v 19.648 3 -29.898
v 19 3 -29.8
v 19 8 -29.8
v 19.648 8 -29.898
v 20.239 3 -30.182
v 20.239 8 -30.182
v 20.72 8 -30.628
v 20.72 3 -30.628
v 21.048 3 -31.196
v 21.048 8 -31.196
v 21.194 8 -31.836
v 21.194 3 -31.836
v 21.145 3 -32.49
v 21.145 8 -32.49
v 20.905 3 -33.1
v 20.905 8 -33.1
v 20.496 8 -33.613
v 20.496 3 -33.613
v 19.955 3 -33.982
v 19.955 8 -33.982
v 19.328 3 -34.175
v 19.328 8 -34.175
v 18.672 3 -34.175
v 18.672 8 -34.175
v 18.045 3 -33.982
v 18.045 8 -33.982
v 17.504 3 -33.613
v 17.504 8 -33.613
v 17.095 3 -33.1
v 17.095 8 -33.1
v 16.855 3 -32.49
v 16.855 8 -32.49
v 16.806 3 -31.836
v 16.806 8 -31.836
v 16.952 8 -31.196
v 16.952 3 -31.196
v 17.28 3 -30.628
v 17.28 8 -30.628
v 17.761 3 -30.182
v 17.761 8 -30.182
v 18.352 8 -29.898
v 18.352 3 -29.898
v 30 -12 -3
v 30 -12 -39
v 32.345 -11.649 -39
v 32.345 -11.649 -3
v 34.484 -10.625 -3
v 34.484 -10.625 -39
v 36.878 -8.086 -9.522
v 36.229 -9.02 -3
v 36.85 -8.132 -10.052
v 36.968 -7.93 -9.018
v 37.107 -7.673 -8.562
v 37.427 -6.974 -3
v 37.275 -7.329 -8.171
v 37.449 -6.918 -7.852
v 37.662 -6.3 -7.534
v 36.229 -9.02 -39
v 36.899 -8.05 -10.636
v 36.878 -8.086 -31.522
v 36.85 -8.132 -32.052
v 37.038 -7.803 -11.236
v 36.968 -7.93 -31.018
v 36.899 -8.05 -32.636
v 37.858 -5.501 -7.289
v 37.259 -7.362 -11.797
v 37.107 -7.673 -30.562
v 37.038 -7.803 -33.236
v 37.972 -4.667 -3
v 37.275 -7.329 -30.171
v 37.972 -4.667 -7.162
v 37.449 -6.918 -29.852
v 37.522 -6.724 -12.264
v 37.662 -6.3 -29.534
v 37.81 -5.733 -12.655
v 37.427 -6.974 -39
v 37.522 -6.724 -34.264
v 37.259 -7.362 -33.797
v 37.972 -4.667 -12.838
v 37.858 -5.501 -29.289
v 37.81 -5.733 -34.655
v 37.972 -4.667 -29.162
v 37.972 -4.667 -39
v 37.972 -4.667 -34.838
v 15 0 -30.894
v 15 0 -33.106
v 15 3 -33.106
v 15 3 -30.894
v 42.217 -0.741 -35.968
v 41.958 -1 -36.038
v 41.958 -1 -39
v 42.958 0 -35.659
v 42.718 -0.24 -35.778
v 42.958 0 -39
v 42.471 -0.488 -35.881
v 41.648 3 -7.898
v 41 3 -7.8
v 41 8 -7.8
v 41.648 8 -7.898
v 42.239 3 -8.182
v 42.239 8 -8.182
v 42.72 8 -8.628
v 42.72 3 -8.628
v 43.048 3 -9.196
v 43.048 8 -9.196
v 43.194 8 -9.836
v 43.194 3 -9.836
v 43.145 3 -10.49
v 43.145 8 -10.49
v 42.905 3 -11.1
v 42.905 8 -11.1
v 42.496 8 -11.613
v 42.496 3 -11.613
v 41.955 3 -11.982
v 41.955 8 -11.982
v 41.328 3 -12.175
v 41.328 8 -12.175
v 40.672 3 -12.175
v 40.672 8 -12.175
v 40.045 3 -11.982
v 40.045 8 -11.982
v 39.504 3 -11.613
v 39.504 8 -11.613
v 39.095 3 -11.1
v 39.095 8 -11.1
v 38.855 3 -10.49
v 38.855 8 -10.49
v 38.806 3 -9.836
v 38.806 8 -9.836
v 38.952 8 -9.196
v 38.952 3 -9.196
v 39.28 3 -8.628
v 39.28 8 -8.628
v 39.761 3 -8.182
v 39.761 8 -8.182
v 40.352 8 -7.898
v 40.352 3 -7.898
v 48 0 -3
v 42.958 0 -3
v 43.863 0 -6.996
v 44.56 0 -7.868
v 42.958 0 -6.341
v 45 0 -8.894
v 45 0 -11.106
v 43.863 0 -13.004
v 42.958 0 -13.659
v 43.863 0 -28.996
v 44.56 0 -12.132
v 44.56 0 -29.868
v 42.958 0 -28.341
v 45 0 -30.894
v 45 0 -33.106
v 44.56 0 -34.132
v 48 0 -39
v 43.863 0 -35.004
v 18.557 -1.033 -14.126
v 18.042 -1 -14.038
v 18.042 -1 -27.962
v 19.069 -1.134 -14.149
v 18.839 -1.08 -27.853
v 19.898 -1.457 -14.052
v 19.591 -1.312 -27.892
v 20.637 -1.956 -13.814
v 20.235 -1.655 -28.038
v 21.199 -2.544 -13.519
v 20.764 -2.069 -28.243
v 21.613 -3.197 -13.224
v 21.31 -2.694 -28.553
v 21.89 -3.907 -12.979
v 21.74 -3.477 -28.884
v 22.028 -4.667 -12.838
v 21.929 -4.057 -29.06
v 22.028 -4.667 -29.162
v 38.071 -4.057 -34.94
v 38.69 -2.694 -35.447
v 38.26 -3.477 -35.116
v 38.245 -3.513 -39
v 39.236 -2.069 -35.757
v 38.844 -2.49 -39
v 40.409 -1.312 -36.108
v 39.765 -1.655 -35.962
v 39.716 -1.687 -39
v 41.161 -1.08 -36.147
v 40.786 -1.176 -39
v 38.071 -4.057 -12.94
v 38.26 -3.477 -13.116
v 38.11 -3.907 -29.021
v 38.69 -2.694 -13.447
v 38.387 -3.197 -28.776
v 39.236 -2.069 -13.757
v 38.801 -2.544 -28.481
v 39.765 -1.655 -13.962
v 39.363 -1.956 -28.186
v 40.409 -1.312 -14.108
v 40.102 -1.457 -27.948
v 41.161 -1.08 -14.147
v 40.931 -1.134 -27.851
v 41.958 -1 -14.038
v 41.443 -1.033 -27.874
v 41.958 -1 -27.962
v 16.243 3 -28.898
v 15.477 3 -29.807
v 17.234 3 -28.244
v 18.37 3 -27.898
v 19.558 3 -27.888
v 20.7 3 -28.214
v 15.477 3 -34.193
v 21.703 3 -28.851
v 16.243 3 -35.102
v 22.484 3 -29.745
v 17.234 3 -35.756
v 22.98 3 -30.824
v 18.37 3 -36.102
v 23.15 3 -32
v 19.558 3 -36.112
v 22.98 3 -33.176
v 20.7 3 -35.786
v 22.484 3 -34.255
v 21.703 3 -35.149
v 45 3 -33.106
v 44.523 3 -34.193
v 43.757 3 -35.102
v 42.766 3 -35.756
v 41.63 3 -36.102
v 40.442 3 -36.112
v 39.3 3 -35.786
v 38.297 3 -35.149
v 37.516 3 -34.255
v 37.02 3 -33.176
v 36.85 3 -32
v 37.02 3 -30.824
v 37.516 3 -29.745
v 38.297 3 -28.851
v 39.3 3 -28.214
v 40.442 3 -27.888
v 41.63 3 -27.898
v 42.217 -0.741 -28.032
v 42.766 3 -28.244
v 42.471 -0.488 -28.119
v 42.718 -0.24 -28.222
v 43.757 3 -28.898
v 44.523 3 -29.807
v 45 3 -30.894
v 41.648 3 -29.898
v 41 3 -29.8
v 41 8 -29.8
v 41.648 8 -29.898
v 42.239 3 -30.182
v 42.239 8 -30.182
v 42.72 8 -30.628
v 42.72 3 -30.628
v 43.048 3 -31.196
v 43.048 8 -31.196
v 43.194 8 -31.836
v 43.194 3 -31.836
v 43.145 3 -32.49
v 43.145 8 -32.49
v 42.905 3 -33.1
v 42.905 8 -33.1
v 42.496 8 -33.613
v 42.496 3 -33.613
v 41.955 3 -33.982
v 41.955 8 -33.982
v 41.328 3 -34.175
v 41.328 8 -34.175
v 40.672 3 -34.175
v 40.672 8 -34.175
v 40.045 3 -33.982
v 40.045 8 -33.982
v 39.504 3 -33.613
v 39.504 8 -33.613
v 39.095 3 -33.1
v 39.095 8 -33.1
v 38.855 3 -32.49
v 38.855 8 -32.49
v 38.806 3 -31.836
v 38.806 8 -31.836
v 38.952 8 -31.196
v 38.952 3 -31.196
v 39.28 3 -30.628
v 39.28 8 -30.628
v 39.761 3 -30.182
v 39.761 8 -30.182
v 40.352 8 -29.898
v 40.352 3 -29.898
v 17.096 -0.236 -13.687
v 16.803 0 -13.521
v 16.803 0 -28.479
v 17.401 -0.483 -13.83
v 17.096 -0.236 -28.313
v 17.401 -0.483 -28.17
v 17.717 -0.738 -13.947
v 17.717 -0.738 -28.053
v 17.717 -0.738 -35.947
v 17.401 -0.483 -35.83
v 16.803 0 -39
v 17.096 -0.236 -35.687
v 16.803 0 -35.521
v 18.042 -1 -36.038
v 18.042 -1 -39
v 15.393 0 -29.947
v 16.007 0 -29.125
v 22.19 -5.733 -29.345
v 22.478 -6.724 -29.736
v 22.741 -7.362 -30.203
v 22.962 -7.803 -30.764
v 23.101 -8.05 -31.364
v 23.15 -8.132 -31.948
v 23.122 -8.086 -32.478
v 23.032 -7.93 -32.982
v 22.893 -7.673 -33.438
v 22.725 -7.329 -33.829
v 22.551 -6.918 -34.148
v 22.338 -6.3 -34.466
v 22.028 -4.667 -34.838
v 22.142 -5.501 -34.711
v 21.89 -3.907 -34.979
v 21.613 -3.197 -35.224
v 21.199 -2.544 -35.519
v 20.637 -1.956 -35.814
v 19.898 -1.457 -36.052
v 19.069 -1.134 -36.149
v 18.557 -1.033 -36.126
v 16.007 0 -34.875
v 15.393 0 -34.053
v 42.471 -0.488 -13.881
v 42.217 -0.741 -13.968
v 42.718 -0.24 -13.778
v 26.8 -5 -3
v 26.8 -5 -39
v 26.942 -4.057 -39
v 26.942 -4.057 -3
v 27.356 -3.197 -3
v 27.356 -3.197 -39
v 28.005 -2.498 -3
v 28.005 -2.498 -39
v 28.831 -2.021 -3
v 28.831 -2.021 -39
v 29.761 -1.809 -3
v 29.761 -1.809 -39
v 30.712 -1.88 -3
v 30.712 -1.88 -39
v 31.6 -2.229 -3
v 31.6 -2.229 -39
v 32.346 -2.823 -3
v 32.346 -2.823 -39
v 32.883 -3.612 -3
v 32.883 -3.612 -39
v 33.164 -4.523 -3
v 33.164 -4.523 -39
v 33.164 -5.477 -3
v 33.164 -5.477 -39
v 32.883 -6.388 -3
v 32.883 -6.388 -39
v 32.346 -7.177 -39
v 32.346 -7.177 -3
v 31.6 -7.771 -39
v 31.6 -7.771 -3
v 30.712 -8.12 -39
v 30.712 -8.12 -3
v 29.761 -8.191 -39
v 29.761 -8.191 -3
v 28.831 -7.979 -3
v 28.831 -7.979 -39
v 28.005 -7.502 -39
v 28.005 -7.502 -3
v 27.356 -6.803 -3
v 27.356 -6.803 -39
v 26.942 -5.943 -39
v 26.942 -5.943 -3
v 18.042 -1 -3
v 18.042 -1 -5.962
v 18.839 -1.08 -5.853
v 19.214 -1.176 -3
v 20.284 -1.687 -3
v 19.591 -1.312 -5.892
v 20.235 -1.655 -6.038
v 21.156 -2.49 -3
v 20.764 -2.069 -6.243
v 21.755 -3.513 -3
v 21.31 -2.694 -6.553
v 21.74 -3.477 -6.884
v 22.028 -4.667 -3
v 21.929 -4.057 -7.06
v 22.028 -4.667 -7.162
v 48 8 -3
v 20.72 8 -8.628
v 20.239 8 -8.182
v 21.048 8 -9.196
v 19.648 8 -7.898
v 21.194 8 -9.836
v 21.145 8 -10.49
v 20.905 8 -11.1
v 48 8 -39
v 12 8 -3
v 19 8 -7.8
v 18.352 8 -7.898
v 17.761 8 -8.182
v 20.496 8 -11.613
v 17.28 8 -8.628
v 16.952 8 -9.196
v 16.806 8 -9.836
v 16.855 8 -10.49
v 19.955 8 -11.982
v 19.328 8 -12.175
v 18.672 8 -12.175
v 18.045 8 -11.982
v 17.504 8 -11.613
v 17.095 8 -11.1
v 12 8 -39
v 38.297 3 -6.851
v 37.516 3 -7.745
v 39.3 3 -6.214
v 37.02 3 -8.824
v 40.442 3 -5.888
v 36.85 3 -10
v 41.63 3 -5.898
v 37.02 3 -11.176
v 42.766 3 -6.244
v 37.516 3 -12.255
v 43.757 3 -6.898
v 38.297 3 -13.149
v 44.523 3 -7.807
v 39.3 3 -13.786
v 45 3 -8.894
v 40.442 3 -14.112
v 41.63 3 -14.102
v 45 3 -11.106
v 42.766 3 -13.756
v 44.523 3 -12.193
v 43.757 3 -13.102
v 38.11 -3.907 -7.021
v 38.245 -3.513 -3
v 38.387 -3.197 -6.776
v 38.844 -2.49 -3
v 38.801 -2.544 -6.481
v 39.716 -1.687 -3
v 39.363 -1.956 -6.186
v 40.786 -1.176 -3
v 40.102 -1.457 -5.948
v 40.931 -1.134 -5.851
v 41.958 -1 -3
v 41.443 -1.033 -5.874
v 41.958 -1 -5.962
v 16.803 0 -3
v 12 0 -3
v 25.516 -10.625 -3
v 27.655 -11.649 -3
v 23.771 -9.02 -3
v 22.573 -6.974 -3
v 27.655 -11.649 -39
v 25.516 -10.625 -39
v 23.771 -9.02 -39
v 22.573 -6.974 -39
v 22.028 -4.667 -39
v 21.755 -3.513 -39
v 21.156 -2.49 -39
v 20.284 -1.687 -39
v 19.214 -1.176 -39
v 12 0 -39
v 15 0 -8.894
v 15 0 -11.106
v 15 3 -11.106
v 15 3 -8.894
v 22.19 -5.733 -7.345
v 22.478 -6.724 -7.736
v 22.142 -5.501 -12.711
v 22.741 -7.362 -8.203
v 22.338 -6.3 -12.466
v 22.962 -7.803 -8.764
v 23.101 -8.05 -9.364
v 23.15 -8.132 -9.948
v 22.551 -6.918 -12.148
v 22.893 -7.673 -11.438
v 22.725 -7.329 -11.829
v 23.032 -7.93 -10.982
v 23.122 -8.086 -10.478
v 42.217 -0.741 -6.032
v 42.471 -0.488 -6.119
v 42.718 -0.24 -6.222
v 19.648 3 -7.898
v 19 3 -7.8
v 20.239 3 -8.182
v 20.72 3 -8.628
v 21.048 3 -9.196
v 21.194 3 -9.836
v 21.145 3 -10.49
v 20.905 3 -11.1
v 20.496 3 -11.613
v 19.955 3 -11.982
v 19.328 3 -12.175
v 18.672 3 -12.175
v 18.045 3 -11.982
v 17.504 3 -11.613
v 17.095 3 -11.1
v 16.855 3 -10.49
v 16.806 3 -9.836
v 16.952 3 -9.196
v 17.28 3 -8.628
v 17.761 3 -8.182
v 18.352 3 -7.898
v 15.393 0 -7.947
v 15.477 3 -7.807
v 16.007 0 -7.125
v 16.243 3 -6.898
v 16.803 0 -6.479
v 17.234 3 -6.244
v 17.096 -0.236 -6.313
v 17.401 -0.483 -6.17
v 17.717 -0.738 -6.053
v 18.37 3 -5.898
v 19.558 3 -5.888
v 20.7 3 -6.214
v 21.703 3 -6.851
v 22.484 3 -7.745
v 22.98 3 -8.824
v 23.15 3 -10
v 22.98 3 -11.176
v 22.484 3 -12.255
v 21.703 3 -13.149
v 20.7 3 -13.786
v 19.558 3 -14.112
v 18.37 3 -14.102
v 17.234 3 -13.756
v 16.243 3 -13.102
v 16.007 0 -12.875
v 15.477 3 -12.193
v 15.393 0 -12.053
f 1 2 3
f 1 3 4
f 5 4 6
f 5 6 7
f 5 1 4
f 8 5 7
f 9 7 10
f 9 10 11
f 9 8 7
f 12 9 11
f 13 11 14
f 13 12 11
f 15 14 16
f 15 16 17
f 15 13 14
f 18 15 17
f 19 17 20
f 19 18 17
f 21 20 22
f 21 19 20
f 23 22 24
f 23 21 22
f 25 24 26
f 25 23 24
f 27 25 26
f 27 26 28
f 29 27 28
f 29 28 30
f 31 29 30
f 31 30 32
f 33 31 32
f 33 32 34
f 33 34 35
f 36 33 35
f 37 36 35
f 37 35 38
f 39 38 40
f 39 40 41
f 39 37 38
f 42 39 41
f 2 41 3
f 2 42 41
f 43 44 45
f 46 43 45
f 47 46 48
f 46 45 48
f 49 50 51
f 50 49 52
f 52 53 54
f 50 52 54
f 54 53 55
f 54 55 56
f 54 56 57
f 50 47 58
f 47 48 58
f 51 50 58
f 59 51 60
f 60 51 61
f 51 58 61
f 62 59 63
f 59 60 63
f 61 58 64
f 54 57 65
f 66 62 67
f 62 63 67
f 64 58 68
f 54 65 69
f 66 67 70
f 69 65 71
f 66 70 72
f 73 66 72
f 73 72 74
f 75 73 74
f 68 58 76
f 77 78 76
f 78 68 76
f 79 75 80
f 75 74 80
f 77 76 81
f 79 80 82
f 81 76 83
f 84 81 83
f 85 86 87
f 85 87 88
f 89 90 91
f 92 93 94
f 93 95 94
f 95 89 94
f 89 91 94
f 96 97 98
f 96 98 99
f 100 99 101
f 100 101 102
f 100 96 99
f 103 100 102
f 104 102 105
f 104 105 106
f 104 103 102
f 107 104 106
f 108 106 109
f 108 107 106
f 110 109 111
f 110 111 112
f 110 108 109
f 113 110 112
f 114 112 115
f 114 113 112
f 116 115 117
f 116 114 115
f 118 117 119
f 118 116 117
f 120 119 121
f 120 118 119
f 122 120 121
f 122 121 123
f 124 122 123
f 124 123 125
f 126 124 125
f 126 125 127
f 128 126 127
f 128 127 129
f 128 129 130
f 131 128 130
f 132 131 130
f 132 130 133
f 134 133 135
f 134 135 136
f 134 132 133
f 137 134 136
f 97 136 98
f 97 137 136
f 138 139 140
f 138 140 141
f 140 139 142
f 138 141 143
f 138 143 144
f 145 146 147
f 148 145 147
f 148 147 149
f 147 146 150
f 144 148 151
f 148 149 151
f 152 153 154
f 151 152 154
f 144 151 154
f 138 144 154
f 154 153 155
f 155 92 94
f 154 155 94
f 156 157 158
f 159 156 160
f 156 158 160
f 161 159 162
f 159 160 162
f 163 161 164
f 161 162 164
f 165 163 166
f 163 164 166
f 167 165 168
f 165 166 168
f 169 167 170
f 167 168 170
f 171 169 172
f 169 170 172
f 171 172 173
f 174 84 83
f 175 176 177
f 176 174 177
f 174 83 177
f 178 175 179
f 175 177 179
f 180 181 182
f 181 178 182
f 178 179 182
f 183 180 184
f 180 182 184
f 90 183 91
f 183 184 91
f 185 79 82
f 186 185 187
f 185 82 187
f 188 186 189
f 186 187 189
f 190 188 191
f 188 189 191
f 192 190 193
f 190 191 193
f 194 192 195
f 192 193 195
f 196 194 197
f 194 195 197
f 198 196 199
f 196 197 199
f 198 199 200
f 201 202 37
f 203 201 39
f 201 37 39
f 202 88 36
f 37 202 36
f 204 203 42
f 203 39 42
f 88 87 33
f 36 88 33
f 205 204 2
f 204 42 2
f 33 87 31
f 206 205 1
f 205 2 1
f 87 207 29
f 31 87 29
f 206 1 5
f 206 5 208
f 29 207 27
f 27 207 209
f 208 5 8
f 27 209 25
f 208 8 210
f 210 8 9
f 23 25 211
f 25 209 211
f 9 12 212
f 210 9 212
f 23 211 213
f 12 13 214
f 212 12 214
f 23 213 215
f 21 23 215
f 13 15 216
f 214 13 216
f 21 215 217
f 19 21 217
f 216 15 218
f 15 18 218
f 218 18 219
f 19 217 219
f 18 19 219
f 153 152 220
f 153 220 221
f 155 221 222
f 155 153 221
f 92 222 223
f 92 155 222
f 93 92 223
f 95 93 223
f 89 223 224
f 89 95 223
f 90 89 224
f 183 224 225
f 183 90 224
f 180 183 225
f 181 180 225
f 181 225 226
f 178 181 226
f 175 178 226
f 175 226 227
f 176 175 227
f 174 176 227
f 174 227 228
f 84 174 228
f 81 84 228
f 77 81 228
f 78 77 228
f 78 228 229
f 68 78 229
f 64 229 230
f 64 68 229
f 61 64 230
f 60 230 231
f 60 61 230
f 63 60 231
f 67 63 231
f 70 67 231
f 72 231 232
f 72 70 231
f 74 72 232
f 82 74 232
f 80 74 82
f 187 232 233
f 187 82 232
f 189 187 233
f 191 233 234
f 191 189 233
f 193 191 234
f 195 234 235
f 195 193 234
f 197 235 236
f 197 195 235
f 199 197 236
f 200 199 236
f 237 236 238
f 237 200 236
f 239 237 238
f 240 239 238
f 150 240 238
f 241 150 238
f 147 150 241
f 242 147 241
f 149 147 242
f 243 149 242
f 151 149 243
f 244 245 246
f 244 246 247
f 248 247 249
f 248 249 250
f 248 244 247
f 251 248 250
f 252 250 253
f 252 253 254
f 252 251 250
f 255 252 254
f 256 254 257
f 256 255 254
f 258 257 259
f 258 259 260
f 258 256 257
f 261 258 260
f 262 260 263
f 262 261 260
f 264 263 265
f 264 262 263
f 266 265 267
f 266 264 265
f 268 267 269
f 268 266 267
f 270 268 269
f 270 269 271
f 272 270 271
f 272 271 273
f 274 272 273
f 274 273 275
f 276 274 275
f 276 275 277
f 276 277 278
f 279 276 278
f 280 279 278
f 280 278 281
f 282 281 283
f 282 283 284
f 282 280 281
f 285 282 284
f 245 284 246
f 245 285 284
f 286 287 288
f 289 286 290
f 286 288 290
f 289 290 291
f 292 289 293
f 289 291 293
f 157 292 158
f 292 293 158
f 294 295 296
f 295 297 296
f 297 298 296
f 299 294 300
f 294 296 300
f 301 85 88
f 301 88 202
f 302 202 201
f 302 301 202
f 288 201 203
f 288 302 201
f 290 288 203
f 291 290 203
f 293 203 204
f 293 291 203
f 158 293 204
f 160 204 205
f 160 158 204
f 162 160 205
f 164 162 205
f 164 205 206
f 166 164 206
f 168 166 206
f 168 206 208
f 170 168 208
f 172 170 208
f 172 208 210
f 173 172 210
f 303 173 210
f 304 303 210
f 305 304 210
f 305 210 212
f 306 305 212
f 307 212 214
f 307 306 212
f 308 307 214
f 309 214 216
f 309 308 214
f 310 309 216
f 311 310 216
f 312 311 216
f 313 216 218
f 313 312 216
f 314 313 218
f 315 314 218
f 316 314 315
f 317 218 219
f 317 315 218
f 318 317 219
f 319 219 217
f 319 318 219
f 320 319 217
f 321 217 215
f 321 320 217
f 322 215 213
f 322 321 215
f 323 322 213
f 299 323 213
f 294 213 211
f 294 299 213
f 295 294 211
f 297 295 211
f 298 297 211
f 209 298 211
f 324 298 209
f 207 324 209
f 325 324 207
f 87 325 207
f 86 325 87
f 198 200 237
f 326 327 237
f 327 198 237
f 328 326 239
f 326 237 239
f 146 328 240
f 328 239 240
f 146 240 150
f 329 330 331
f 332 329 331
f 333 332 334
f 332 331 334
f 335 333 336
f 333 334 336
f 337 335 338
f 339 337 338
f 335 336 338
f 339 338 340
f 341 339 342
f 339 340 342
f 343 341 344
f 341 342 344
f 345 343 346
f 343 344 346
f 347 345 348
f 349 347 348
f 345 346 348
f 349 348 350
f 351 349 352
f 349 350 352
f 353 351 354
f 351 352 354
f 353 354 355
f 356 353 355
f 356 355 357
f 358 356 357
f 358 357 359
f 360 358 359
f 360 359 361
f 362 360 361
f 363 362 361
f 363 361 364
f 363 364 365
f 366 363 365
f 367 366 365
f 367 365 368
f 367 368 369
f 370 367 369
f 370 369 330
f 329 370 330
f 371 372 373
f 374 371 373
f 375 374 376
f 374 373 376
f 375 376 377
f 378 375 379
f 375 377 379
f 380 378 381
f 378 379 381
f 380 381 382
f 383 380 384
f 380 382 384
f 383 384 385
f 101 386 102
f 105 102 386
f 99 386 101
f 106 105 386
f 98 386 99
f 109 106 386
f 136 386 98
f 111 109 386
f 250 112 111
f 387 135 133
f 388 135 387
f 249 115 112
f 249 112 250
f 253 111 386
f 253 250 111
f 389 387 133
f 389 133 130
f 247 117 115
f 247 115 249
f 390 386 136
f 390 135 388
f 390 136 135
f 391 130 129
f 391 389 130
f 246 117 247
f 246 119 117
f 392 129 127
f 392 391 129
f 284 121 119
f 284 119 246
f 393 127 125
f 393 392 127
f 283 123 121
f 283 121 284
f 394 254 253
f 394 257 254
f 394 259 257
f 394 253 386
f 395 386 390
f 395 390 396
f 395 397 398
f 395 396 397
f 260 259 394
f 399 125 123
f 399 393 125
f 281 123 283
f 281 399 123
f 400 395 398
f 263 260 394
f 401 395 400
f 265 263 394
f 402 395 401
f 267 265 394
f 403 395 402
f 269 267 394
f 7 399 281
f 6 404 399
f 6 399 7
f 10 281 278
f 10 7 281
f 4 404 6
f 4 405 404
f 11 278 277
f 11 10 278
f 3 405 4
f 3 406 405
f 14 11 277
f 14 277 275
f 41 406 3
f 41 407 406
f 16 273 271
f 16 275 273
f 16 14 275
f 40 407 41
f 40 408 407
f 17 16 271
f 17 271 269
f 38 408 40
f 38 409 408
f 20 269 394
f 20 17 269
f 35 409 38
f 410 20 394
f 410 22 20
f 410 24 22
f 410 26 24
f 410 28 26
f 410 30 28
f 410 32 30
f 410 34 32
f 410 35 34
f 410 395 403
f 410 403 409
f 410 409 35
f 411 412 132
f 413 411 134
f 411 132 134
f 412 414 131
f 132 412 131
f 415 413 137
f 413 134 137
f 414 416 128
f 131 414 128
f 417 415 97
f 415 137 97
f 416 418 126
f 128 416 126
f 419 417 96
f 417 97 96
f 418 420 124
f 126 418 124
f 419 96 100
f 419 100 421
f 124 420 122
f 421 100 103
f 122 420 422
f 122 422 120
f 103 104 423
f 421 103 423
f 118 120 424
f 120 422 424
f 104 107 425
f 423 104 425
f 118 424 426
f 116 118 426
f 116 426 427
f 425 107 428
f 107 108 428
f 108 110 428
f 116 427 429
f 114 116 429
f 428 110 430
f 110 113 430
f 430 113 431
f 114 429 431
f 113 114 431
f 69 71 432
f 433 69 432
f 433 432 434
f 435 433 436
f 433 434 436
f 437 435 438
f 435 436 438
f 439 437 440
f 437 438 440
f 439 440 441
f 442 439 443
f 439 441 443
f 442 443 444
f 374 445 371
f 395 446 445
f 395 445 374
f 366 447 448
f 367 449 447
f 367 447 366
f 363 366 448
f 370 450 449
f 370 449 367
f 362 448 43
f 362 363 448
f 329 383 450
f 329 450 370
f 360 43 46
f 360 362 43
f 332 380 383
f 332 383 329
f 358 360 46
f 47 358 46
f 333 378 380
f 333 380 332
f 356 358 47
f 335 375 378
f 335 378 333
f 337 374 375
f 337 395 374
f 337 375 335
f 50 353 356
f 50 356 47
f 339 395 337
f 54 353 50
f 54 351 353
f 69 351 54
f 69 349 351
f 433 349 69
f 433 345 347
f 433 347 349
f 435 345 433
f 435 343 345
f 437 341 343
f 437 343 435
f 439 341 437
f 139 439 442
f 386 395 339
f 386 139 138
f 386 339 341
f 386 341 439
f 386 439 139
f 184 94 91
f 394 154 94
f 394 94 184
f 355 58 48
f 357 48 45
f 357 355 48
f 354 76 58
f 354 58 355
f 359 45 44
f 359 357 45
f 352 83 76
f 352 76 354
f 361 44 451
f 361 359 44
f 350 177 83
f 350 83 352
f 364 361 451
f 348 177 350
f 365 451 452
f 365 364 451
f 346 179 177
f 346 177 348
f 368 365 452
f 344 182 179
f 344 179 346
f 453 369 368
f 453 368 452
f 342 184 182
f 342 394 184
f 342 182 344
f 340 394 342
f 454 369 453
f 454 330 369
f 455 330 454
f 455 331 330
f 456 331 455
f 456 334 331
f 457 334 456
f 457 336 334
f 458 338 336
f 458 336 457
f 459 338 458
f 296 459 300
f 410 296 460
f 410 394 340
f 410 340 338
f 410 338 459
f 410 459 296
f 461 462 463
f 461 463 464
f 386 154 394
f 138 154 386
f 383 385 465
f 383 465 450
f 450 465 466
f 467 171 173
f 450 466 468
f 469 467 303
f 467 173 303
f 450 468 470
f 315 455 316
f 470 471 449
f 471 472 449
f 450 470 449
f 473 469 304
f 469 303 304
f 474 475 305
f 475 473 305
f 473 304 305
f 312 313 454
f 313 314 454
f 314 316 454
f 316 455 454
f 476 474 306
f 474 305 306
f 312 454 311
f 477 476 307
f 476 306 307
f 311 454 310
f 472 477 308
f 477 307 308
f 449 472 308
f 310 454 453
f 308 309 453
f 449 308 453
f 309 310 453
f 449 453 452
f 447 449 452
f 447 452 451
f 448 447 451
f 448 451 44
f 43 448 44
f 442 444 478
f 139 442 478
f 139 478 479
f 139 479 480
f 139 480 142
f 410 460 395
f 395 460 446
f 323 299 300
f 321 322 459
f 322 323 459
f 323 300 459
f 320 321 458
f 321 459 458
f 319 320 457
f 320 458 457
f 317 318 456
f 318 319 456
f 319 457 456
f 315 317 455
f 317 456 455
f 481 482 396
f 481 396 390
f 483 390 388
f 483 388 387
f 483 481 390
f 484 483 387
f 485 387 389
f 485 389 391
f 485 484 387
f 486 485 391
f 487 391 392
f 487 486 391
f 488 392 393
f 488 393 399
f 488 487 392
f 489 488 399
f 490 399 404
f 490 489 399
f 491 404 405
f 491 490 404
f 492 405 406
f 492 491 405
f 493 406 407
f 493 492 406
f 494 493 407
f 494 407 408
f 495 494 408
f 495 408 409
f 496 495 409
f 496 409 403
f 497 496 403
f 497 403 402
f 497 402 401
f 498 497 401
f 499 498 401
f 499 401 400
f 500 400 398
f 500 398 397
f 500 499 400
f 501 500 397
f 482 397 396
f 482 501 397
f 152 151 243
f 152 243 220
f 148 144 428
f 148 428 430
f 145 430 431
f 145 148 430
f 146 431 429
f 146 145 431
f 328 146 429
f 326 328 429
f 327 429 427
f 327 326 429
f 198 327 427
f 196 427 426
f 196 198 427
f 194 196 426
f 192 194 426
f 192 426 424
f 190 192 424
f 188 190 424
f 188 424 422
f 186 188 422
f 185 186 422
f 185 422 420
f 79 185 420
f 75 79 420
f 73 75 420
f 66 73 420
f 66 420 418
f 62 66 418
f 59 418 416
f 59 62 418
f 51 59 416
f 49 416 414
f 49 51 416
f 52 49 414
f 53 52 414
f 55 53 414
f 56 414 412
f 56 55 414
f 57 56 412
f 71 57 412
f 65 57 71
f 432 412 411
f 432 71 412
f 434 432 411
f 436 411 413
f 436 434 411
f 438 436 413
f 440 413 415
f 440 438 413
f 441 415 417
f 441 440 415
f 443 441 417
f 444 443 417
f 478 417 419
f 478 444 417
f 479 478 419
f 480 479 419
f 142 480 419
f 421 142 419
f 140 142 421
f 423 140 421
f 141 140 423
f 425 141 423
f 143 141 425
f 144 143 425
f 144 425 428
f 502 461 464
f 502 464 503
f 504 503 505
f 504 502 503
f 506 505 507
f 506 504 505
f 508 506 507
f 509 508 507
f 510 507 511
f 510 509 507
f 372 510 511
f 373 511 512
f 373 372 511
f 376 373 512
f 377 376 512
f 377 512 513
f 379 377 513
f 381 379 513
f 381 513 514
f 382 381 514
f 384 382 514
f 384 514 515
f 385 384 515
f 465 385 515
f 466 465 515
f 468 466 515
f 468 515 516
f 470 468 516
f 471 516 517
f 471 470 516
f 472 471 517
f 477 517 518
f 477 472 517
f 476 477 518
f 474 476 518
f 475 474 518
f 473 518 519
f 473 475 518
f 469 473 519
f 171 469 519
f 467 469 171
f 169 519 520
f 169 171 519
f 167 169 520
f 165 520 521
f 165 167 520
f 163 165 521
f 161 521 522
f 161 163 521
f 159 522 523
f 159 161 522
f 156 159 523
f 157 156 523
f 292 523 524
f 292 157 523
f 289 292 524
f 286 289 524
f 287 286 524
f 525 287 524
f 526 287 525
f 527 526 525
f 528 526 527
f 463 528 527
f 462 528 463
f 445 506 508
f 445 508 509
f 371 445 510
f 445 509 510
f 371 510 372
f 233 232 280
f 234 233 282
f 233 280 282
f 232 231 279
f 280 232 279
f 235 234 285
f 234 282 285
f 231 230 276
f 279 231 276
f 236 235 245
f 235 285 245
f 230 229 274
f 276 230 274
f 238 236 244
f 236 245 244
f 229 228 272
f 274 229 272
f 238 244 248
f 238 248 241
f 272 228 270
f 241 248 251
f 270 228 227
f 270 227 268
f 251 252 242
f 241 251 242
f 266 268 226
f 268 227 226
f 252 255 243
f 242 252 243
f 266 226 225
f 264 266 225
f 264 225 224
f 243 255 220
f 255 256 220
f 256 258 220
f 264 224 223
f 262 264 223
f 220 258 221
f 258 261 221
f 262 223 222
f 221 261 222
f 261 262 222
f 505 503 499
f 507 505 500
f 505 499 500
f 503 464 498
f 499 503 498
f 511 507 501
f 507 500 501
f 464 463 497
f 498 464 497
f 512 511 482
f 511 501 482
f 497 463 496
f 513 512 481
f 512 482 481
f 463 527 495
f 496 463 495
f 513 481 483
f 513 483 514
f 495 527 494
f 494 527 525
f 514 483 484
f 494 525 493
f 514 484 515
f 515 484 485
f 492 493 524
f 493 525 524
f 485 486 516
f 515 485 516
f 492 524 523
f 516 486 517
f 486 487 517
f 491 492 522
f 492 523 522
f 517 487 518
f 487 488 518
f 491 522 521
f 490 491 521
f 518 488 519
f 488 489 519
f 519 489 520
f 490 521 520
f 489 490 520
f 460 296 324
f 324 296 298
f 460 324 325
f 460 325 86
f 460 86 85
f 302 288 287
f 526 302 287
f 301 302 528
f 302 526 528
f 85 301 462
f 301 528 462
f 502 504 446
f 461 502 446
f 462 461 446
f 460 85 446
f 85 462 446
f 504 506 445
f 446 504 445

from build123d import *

# Parameters (mm, degrees)
SKETCH1_W            = 60
SKETCH1_H            = 42
BOSS_EXTRUDE1_DEPTH  = 8
SKETCH3_W            = 10
SKETCH3_H            = 42
BOSS_EXTRUDE5_DEPTH  = 6
SKETCH5_W            = 14
SKETCH5_H            = 42
BOSS_EXTRUDE6_DEPTH  = 11
SKETCH6_R            = 3.2
CUT_EXTRUDE1_DEPTH   = 75.565407529
FILLET1_R            = 7
FILLET2_R            = 5
FILLET3_R            = 5
BOSS_EXTRUDE7_DEPTH  = 42
SKETCH9_W            = 5
SKETCH9_H            = 42
BOSS_EXTRUDE8_DEPTH  = 6
SKETCH11_W           = 15
SKETCH11_H           = 42
CUT_EXTRUDE2_DEPTH   = 76.921011584
SKETCH12_W           = 30
SKETCH12_H           = 42
CUT_EXTRUDE3_DEPTH   = 6
SKETCH15_W           = 42
SKETCH15_H           = 8
BOSS_EXTRUDE9_DEPTH  = 5
SKETCH16_W           = 42
SKETCH16_H           = 8
BOSS_EXTRUDE10_DEPTH = 5
CUT_EXTRUDE7_START   = -17
CUT_EXTRUDE7_DEPTH   = 17
BOSS_EXTRUDE11_START = -5
SKETCH17_R           = 4.15
SKETCH17_R_2         = 2.2
BOSS_EXTRUDE11_DEPTH = 5
SKETCH18_W           = 2
SKETCH18_H           = 42
CUT_EXTRUDE8_DEPTH   = 67.392770772
CUT_EXTRUDE9_DEPTH   = 3
CUT_EXTRUDE10_START  = -3
CUT_EXTRUDE10_DEPTH  = 3


with BuildPart() as part:
    # Sketch1 → Boss-Extrude1 (new body)
    with BuildSketch(Plane(origin=(0, 0, 0), x_dir=(1, 0, 0), z_dir=(0, 1, 0))):
        with Locations((30, 21)):
            Rectangle(SKETCH1_W, SKETCH1_H)
    extrude(amount=BOSS_EXTRUDE1_DEPTH)

    # Sketch3 → Boss-Extrude5 (add)
    with BuildSketch(Plane(origin=(0, 8, 0), x_dir=(1, 0, 0), z_dir=(0, 1, 0))):
        with Locations((30, 21)):
            Rectangle(SKETCH3_W, SKETCH3_H)
    extrude(amount=BOSS_EXTRUDE5_DEPTH)

    # Sketch5 → Boss-Extrude6 (add)
    with BuildSketch(Plane.XZ):
        with Locations((30, -21)):
            Rectangle(SKETCH5_W, SKETCH5_H)
    extrude(amount=BOSS_EXTRUDE6_DEPTH)

    # Sketch6 → Cut-Extrude1 (cut, through all)
    with BuildSketch(Plane(origin=(0, 0, -42), x_dir=(-1, 0, 0), z_dir=(0, 0, -1))):
        with Locations((-30, -5)):
            Circle(SKETCH6_R)
    extrude(amount=-CUT_EXTRUDE1_DEPTH, mode=Mode.SUBTRACT)

    # Fillet1
    fillet1_edges = [part.edges().sort_by_distance(p)[0] for p in [
        (23, -11, -21),
        (37, -11, -21),
    ]]
    fillet(fillet1_edges, radius=FILLET1_R - 0.0001)  # a hair under: the kernel refuses the full size

    # Fillet2
    fillet2_edges = [part.edges().sort_by_distance(p)[0] for p in [
        (23, 0, -21),
    ]]
    fillet(fillet2_edges, radius=FILLET2_R)

    # Fillet3
    fillet3_edges = [part.edges().sort_by_distance(p)[0] for p in [
        (37, 0, -21),
    ]]
    fillet(fillet3_edges, radius=FILLET3_R)

    # Sketch8 → Boss-Extrude7 (add)
    with BuildSketch(Plane(origin=(0, 0, -42), x_dir=(-1, 0, 0), z_dir=(0, 0, -1))):
        with BuildLine():
            Line((-41.958260743, -1), (-42.958260743, 0))
            Line((-42.958260743, 0), (-41.958260743, 0))
            ThreePointArc((-41.958260743, 0), (-38.573244741, -1.320099639), (-36.9756521, -4.583333333))
            ThreePointArc((-36.9756521, -4.583333333), (-34.739022403, -9.151860505), (-30, -11))
            ThreePointArc((-30, -11), (-25.260977597, -9.151860505), (-23.0243479, -4.583333333))
            ThreePointArc((-23.0243479, -4.583333333), (-21.426755259, -1.320099639), (-18.041739257, 0))
            Line((-18.041739257, 0), (-16.803044796, 0))
            Line((-16.803044796, 0), (-18.041739257, -1))
            ThreePointArc((-18.041739257, -1), (-20.749752058, -2.056079711), (-22.027826171, -4.666666667))
            ThreePointArc((-22.027826171, -4.666666667), (-24.583974397, -9.887840578), (-30, -12))
            ThreePointArc((-30, -12), (-35.416025603, -9.887840578), (-37.972173829, -4.666666667))
            ThreePointArc((-37.972173829, -4.666666667), (-39.250247942, -2.056079711), (-41.958260743, -1))
        make_face()
    extrude(amount=-BOSS_EXTRUDE7_DEPTH)

    # Sketch9 → Boss-Extrude8 (add)
    with BuildSketch(Plane(origin=(0, 8, 0), x_dir=(1, 0, 0), z_dir=(0, 1, 0))):
        with Locations((42.5, 21)):
            Rectangle(SKETCH9_W, SKETCH9_H)
        with Locations((17.5, 21)):
            Rectangle(SKETCH9_W, SKETCH9_H)
    extrude(amount=BOSS_EXTRUDE8_DEPTH)

    # Sketch11 → Cut-Extrude2 (cut, through all)
    with BuildSketch(Plane(origin=(0, 8, 0), x_dir=(1, 0, 0), z_dir=(0, 1, 0))):
        with Locations((52.5, 21)):
            Rectangle(SKETCH11_W, SKETCH11_H)
        with Locations((7.5, 21)):
            Rectangle(SKETCH11_W, SKETCH11_H)
    extrude(amount=-CUT_EXTRUDE2_DEPTH, mode=Mode.SUBTRACT)

    # Sketch12 → Cut-Extrude3 (cut)
    with BuildSketch(Plane(origin=(0, 14, 0), x_dir=(1, 0, 0), z_dir=(0, 1, 0))):
        with Locations((30, 21)):
            Rectangle(SKETCH12_W, SKETCH12_H)
    extrude(amount=-CUT_EXTRUDE3_DEPTH, mode=Mode.SUBTRACT)

    # Sketch15 → Boss-Extrude9 (add)
    with BuildSketch(Plane.ZY.offset(-15)):
        with Locations((-21, 4)):
            Rectangle(SKETCH15_W, SKETCH15_H)
    extrude(amount=BOSS_EXTRUDE9_DEPTH)

    # Sketch16 → Boss-Extrude10 (add)
    with BuildSketch(Plane(origin=(45, 0, 0), x_dir=(0, 0, -1), z_dir=(1, 0, 0))):
        with Locations((21, 4)):
            Rectangle(SKETCH16_W, SKETCH16_H)
    extrude(amount=BOSS_EXTRUDE10_DEPTH)

    # Cut-Extrude7: read off the stored shape, not the designer's step
    # Cut-Extrude7 outline → Cut-Extrude7 (cut)
    with BuildSketch(Plane(origin=(0, 8, 0), x_dir=(1, 0, 0), z_dir=(0, 1, 0)).offset(CUT_EXTRUDE7_START)):
        with BuildLine():
            ThreePointArc((45, 33.105667219), (36.85, 32), (45, 30.894332781))
            Line((45, 30.894332781), (45, 33.105667219))
        make_face()
        with BuildLine():
            ThreePointArc((45, 11.105667219), (36.85, 10), (45, 8.894332781))
            Line((45, 8.894332781), (45, 11.105667219))
        make_face()
        with BuildLine():
            ThreePointArc((15, 8.894332781), (23.15, 10), (15, 11.105667219))
            Line((15, 11.105667219), (15, 8.894332781))
        make_face()
        with BuildLine():
            ThreePointArc((15, 30.894332781), (23.15, 32), (15, 33.105667219))
            Line((15, 33.105667219), (15, 30.894332781))
        make_face()
    extrude(amount=CUT_EXTRUDE7_DEPTH, mode=Mode.SUBTRACT)

    # Sketch17 → Boss-Extrude11 (add)
    # profile 1 of 4: a face of its own
    with BuildSketch(Plane(origin=(0, 8, 0), x_dir=(1, 0, 0), z_dir=(0, 1, 0)).offset(BOSS_EXTRUDE11_START)):
        with Locations((41, 32)):
            Circle(SKETCH17_R)
        with Locations(Location((41, 32, 0), (0, 0, 270))):
            Circle(SKETCH17_R_2, mode=Mode.SUBTRACT)
    # profile 2 of 4: a face of its own
    with BuildSketch(Plane(origin=(0, 8, 0), x_dir=(1, 0, 0), z_dir=(0, 1, 0)).offset(BOSS_EXTRUDE11_START)):
        with Locations((19, 10)):
            Circle(SKETCH17_R)
        with Locations(Location((19, 10, 0), (0, 0, 270))):
            Circle(SKETCH17_R_2, mode=Mode.SUBTRACT)
    # profile 3 of 4: a face of its own
    with BuildSketch(Plane(origin=(0, 8, 0), x_dir=(1, 0, 0), z_dir=(0, 1, 0)).offset(BOSS_EXTRUDE11_START)):
        with Locations((41, 10)):
            Circle(SKETCH17_R)
        with Locations(Location((41, 10, 0), (0, 0, 270))):
            Circle(SKETCH17_R_2, mode=Mode.SUBTRACT)
    # profile 4 of 4: a face of its own
    with BuildSketch(Plane(origin=(0, 8, 0), x_dir=(1, 0, 0), z_dir=(0, 1, 0)).offset(BOSS_EXTRUDE11_START)):
        with Locations((19, 32)):
            Circle(SKETCH17_R)
        with Locations(Location((19, 32, 0), (0, 0, 270))):
            Circle(SKETCH17_R_2, mode=Mode.SUBTRACT)
    extrude(amount=BOSS_EXTRUDE11_DEPTH)

    # Sketch18 → Cut-Extrude8 (cut, through all)
    with BuildSketch(Plane.XZ):
        with Locations((11, -21)):
            Rectangle(SKETCH18_W, SKETCH18_H)
        with Locations((49, -21)):
            Rectangle(SKETCH18_W, SKETCH18_H)
    extrude(amount=-CUT_EXTRUDE8_DEPTH, mode=Mode.SUBTRACT)

    # Sketch20 → Cut-Extrude9 (cut)
    with BuildSketch(Plane(origin=(0, 0, -42), x_dir=(-1, 0, 0), z_dir=(0, 0, -1))):
        with BuildLine():
            Line((-16.803044796, 0), (-12, 0))
            Line((-12, 0), (-12, 8))
            Line((-12, 8), (-48, 8))
            Line((-48, 8), (-48, 0))
            Line((-48, 0), (-42.958260743, 0))
            Line((-42.958260743, 0), (-41.958260743, -1))
            ThreePointArc((-41.958260743, -1), (-39.250247942, -2.056079711), (-37.972173829, -4.666666667))
            ThreePointArc((-37.972173829, -4.666666667), (-30, -12), (-22.027826171, -4.666666667))
            ThreePointArc((-22.027826171, -4.666666667), (-20.749752058, -2.056079711), (-18.041739257, -1))
            Line((-18.041739257, -1), (-16.803044796, 0))
        make_face()
    extrude(amount=-CUT_EXTRUDE9_DEPTH, mode=Mode.SUBTRACT)

    # Sketch19 → Cut-Extrude10 (cut)
    with BuildSketch(Plane.XY.offset(CUT_EXTRUDE10_START)):
        with BuildLine():
            Line((48, 8), (12, 8))
            Line((12, 8), (12, 0))
            Line((12, 0), (16.803044796, 0))
            Line((16.803044796, 0), (18.041739257, -1))
            ThreePointArc((18.041739257, -1), (20.749752058, -2.056079711), (22.027826171, -4.666666667))
            ThreePointArc((22.027826171, -4.666666667), (30, -12), (37.972173829, -4.666666667))
            ThreePointArc((37.972173829, -4.666666667), (39.250247942, -2.056079711), (41.958260743, -1))
            Line((41.958260743, -1), (42.958260743, 0))
            Line((42.958260743, 0), (48, 0))
            Line((48, 0), (48, 8))
        make_face()
    extrude(amount=CUT_EXTRUDE10_DEPTH, mode=Mode.SUBTRACT)


solid = part.part
